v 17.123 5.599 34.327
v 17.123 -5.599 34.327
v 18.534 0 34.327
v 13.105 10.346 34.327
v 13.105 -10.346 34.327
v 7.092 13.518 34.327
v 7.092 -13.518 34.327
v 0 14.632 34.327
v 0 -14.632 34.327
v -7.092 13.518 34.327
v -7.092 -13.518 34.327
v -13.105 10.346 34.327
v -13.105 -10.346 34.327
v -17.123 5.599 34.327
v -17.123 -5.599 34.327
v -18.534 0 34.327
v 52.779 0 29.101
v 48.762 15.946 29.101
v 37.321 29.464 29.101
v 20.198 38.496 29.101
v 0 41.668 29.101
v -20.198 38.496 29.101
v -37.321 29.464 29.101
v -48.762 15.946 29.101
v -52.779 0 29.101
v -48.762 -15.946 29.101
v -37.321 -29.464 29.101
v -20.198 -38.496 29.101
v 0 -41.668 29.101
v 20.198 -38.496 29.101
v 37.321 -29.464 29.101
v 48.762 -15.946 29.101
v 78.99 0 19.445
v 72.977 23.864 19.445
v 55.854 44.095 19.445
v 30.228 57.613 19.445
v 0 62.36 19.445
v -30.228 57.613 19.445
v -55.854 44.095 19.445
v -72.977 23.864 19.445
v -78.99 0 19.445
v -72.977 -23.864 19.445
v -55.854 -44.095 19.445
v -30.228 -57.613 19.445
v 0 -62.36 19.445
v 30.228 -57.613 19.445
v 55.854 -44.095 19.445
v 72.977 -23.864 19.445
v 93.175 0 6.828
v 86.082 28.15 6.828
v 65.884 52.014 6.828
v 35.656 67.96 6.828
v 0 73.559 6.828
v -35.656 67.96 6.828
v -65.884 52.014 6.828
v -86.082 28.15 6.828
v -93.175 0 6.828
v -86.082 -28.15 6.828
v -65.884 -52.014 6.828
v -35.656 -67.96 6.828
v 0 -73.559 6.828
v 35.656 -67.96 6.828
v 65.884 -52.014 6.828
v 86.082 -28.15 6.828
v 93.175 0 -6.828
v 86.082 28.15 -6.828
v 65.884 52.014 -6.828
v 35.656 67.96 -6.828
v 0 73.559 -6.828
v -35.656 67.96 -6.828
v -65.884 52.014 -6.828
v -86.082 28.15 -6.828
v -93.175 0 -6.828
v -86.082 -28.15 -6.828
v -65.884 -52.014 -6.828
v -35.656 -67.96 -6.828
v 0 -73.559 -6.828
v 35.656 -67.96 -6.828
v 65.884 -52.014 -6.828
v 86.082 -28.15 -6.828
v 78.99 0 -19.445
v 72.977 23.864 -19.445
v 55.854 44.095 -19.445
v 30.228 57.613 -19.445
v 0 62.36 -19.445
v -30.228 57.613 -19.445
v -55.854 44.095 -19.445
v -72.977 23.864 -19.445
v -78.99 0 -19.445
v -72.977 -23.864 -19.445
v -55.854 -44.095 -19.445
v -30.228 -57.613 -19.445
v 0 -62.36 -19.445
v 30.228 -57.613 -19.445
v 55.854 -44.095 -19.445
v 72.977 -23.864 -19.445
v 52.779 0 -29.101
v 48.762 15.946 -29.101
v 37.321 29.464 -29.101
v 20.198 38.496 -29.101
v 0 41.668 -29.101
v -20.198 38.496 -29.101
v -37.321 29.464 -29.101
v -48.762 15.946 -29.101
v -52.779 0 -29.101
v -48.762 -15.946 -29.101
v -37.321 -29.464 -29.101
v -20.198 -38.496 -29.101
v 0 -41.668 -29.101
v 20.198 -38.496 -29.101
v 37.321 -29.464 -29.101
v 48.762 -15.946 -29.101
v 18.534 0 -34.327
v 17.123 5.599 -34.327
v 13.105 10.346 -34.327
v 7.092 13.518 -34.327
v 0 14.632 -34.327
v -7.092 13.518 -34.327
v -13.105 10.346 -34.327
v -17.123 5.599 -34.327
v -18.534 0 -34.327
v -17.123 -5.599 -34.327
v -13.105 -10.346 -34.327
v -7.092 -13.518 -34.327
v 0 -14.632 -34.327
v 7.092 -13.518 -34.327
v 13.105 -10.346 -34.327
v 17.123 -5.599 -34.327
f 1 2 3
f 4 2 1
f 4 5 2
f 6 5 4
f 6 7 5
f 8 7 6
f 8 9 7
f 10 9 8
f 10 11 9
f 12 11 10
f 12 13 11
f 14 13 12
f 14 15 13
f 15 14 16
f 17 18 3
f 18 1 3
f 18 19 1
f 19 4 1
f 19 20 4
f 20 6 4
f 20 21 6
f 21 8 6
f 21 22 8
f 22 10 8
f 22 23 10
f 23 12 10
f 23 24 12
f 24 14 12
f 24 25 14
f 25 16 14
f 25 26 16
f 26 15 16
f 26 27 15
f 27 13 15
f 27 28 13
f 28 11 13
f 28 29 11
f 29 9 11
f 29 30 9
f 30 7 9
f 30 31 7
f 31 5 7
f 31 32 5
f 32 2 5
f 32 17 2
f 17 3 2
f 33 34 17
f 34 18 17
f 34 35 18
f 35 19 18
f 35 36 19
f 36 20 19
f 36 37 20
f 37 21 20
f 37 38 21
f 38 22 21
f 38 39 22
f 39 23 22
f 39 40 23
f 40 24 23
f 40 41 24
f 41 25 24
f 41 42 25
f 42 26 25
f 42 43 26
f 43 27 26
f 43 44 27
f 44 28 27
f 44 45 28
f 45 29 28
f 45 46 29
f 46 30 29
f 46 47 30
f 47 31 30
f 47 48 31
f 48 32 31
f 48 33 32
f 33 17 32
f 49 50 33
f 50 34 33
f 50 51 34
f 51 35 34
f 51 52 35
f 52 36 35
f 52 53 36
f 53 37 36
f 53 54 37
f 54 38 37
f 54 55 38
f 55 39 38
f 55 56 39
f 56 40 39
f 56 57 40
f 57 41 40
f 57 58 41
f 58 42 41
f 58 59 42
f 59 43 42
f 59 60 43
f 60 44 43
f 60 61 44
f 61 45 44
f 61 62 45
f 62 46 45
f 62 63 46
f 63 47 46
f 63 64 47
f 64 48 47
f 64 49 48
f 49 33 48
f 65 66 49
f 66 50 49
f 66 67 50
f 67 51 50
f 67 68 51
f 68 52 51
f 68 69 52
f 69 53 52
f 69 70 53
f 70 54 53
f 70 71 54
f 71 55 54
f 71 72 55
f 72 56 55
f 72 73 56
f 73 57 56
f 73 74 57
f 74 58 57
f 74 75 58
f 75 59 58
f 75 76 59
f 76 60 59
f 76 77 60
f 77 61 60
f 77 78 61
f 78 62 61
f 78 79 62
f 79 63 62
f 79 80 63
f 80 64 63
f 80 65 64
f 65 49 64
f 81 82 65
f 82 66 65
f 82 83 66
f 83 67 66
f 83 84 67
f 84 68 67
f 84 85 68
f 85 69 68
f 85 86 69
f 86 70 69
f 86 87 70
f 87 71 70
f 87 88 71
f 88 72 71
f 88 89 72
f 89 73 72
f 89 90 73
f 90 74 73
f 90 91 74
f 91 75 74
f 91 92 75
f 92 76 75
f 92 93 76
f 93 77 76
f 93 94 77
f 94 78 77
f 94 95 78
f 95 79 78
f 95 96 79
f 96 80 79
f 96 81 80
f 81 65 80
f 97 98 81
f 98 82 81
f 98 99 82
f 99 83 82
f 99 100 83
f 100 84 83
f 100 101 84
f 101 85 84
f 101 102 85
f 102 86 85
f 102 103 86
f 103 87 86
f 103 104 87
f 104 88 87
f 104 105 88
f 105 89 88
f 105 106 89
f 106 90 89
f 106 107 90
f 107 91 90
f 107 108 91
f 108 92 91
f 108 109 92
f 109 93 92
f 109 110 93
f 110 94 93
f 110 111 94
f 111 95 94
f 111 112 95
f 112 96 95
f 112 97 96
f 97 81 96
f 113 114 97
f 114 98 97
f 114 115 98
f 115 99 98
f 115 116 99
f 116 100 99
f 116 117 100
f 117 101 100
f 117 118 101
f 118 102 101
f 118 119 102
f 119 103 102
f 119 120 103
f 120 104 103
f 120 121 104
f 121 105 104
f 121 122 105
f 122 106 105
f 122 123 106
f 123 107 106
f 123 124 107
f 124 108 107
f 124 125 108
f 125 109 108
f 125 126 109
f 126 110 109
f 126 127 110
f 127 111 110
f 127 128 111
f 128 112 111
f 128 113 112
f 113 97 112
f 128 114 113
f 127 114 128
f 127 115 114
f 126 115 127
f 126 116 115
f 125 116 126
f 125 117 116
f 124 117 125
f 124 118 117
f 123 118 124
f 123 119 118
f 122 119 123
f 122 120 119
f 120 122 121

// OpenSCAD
// Generated by SolidPython 1.0.1 on 2020-07-29 00:46:54


scale(v = [19, 15, 7]) {
	sphere(r = 5);
}
/***********************************************
*********      SolidPython code:      **********
************************************************
 
# import packages: SolidPython
from solid import *
from solid.utils import *
from itertools import chain, combinations, permutations


class Resize:

    def __init__(self, scad_file):
        self.scad_file = scad_file
        #self.scad_file = import_scad(scad_file)
        # cone/cylinder param:
        self.r1 = 0
        self.r2 = 0
        self.h = 0
        # rectangular prism param:
        self.w = 0
        self.l = 0
        # ellipse param:
        self.r = 0

    # import OpenScad code (file name corresponds to shape)


    # classify shape + parameters
    def assign(self, param1, param2, param3):
        if self.scad_file == 'cone.scad':
            self.r1 = param1
            self.r2 = param2
            self.h = param3
        elif self.scad_file == 'cylinder.scad':
            self.r1 = param1
            self.r2 = param2
            self.h = param3
        elif self.scad_file == 'rectangularPrism.scad':
            self.h = param1
            self.l = param2
            self.w = param3
        else:
            self.r = param1
            self.h = param2

    # resize parameters
    def iterate(self):
        x = range(3, 20, 2)
        i = 1
        if self.scad_file == 'cone.scad':
            tempList = list(permutations(x, 2))
            for temp in tempList:
                param1 = temp[0]
                param2 = temp[1]
                filepath = 'produced_scad_files/' + 'cone' + str(param1) + '_' + str(param2) + '_' + '.scad'
                scad_render_to_file(cylinder(h=param1, r1=param2, r2=0), filepath)

        elif self.scad_file == 'cylinder.scad':
            tempList = list(permutations(x, 3))
            for temp in tempList:
                param1 = temp[0]
                param2 = temp[1]
                filepath = 'produced_scad_files/' + 'cylinder' + str(param1) + '_' + str(param2) + '_' + '.scad'
                scad_render_to_file(cylinder(h=param1, r1=param2, r2=param2), filepath)

        elif self.scad_file == 'rectangularPrism.scad':
            tempList = list(permutations(x, 3))
            for temp in tempList:
                param1 = temp[0]
                param2 = temp[1]
                param3 = temp[2]
                filepath = 'produced_scad_files/' + 'rectangularPrism' + str(param1) + '_' + str(param2) + '_' + str(
                    param3) + '.scad'
                scad_render_to_file(cube(size=(param1, param2, param3)), filepath)

        elif self.scad_file == 'ellipse.scad':
            tempList = list(permutations(x, 4))
            for temp in tempList:
                param1 = temp[0]
                param2 = temp[1]
                param3 = temp[2]
                param4 = temp[3]
                filepath = 'produced_scad_files/' + 'ellipse' + str(param1) + '_' + str(param2) + '_' + str(param3) + '_' + str(param4) + '.scad'
                scad_render_to_file(scale([param1, param2, param3])(sphere(r=param4)), filepath)

    def render_to_scadfile(self):
        scad_render_to_file(scad, 'example.scad') 
 
************************************************/
